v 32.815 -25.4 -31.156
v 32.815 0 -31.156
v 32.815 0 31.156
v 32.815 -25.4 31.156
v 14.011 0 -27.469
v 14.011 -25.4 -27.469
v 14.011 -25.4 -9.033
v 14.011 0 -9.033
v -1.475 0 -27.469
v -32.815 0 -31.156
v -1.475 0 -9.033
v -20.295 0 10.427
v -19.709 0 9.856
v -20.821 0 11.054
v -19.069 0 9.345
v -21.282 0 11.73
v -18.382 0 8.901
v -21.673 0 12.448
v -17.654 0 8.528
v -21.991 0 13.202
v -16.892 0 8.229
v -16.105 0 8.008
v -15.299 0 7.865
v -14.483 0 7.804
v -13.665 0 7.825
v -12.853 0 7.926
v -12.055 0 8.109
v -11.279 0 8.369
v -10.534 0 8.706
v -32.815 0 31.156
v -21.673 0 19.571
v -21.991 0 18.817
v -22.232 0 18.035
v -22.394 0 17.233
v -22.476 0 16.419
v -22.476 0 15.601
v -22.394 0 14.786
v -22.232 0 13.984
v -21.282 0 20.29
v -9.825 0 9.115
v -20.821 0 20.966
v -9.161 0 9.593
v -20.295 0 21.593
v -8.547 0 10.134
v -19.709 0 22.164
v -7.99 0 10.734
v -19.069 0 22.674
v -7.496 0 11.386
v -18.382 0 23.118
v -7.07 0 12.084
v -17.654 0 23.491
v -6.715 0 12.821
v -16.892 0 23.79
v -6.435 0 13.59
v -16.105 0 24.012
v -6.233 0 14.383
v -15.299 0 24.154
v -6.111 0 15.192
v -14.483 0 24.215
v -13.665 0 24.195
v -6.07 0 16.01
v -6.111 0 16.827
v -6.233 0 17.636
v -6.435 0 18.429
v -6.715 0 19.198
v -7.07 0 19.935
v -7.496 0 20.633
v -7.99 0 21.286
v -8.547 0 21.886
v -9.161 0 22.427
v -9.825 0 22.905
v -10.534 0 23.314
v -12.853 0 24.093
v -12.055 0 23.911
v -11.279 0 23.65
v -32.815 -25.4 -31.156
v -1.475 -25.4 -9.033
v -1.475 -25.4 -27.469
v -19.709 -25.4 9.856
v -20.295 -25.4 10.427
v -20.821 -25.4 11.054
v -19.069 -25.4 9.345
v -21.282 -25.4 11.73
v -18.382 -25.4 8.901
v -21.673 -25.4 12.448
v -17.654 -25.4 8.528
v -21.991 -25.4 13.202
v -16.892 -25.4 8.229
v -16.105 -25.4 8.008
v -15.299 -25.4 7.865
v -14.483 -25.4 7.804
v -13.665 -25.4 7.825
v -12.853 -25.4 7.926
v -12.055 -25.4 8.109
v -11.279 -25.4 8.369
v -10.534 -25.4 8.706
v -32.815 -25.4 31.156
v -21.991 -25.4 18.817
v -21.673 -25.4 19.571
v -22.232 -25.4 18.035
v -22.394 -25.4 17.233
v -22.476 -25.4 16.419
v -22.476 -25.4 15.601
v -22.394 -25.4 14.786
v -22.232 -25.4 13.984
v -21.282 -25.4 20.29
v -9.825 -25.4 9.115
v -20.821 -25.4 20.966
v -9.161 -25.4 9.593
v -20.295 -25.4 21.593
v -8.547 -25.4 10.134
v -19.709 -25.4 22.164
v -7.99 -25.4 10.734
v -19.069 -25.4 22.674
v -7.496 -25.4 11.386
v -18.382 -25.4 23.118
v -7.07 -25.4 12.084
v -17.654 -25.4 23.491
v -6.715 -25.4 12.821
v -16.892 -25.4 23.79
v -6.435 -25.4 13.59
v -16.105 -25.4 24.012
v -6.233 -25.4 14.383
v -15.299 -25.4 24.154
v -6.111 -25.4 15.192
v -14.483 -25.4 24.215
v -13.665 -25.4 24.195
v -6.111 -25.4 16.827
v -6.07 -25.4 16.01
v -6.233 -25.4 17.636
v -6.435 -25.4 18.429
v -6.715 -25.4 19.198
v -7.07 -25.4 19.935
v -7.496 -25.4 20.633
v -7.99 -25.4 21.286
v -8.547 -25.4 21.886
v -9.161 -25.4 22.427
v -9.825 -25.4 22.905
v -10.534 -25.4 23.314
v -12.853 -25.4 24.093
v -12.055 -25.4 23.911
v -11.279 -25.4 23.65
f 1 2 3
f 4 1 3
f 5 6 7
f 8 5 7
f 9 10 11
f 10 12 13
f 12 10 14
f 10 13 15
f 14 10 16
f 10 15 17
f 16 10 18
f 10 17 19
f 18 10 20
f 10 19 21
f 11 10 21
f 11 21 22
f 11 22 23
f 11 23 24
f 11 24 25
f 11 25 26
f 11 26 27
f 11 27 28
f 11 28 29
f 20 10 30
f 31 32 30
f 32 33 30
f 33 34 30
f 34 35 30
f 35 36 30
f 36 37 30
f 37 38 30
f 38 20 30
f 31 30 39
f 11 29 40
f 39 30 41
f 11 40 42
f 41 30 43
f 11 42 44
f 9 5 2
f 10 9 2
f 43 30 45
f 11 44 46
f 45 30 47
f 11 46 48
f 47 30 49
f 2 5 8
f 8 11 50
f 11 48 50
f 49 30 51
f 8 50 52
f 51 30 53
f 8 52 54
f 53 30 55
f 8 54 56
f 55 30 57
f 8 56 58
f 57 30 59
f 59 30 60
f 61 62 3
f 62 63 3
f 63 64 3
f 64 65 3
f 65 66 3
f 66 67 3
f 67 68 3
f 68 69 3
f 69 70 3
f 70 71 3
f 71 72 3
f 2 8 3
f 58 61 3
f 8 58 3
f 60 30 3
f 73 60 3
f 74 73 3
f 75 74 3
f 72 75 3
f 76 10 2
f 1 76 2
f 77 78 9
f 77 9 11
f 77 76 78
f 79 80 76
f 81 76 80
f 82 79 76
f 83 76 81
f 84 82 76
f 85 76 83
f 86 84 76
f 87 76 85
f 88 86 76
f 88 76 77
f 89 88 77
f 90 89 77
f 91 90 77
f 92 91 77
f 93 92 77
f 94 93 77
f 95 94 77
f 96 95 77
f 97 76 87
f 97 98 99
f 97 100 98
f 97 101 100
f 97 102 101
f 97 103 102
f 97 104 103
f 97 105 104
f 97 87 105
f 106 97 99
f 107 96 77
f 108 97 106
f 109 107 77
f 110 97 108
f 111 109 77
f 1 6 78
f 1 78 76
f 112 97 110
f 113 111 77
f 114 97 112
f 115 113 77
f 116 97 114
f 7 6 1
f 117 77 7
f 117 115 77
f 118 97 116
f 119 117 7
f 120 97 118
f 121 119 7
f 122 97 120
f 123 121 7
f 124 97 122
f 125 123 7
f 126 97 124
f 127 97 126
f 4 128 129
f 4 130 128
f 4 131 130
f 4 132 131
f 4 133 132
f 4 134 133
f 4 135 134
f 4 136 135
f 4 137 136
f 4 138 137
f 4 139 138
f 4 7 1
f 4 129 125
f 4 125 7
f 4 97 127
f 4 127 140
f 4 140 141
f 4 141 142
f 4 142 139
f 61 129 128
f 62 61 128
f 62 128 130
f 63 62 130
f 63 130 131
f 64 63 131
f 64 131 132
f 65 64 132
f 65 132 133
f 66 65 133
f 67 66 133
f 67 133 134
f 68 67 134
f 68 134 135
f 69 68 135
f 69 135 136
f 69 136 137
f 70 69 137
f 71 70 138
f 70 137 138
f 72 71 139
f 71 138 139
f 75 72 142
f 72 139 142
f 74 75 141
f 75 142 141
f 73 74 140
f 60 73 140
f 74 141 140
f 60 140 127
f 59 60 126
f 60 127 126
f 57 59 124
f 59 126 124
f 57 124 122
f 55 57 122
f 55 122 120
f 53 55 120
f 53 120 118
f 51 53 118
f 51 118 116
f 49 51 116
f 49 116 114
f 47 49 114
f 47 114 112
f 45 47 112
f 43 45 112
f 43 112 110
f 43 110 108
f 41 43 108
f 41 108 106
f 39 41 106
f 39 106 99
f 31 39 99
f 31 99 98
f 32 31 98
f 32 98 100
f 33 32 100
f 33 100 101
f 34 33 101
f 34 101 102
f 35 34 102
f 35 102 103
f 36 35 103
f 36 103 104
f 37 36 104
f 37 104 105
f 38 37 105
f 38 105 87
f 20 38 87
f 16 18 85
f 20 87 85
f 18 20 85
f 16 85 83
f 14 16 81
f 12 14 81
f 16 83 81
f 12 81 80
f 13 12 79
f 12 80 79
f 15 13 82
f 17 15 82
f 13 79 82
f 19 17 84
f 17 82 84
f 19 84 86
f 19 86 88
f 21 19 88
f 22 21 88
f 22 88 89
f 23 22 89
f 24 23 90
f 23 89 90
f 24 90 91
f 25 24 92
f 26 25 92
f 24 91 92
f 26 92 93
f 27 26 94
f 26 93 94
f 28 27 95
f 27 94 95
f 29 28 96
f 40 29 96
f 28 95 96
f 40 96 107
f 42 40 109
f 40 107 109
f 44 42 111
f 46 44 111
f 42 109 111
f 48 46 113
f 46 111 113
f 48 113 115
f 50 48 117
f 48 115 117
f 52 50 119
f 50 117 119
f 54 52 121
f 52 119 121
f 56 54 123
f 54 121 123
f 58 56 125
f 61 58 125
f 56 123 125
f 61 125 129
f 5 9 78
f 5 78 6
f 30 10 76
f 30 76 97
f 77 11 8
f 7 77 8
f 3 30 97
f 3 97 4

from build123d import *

# Parameters (mm, degrees)
F0_W     = 65.630324
F0_H     = 62.311936
F1_DEPTH = 25.4
F2_R     = 8.207931
F3_DEPTH = 25.401
F4_W     = 15.485808
F4_H     = 18.435483
F5_DEPTH = 25.4


with BuildPart() as f1:
    # F0 (on Front) → F1 (new body)
    with BuildSketch(Plane.XZ):
        Rectangle(F0_W, F0_H)
    extrude(amount=F1_DEPTH)

    # F2 (on face) → F3 (cut, through all)
    with BuildSketch(Plane.XZ.offset(25.4)):
        with Locations((-14.278099, 16.009722)):
            Circle(F2_R)
    extrude(amount=-F3_DEPTH, mode=Mode.SUBTRACT)

    # F4 (on face) → F5 (cut)
    with BuildSketch(Plane.XZ.offset(25.4)):
        with Locations((6.268065, -18.251129)):
            Rectangle(F4_W, F4_H)
    extrude(amount=-F5_DEPTH, mode=Mode.SUBTRACT)


solid = f1.part
